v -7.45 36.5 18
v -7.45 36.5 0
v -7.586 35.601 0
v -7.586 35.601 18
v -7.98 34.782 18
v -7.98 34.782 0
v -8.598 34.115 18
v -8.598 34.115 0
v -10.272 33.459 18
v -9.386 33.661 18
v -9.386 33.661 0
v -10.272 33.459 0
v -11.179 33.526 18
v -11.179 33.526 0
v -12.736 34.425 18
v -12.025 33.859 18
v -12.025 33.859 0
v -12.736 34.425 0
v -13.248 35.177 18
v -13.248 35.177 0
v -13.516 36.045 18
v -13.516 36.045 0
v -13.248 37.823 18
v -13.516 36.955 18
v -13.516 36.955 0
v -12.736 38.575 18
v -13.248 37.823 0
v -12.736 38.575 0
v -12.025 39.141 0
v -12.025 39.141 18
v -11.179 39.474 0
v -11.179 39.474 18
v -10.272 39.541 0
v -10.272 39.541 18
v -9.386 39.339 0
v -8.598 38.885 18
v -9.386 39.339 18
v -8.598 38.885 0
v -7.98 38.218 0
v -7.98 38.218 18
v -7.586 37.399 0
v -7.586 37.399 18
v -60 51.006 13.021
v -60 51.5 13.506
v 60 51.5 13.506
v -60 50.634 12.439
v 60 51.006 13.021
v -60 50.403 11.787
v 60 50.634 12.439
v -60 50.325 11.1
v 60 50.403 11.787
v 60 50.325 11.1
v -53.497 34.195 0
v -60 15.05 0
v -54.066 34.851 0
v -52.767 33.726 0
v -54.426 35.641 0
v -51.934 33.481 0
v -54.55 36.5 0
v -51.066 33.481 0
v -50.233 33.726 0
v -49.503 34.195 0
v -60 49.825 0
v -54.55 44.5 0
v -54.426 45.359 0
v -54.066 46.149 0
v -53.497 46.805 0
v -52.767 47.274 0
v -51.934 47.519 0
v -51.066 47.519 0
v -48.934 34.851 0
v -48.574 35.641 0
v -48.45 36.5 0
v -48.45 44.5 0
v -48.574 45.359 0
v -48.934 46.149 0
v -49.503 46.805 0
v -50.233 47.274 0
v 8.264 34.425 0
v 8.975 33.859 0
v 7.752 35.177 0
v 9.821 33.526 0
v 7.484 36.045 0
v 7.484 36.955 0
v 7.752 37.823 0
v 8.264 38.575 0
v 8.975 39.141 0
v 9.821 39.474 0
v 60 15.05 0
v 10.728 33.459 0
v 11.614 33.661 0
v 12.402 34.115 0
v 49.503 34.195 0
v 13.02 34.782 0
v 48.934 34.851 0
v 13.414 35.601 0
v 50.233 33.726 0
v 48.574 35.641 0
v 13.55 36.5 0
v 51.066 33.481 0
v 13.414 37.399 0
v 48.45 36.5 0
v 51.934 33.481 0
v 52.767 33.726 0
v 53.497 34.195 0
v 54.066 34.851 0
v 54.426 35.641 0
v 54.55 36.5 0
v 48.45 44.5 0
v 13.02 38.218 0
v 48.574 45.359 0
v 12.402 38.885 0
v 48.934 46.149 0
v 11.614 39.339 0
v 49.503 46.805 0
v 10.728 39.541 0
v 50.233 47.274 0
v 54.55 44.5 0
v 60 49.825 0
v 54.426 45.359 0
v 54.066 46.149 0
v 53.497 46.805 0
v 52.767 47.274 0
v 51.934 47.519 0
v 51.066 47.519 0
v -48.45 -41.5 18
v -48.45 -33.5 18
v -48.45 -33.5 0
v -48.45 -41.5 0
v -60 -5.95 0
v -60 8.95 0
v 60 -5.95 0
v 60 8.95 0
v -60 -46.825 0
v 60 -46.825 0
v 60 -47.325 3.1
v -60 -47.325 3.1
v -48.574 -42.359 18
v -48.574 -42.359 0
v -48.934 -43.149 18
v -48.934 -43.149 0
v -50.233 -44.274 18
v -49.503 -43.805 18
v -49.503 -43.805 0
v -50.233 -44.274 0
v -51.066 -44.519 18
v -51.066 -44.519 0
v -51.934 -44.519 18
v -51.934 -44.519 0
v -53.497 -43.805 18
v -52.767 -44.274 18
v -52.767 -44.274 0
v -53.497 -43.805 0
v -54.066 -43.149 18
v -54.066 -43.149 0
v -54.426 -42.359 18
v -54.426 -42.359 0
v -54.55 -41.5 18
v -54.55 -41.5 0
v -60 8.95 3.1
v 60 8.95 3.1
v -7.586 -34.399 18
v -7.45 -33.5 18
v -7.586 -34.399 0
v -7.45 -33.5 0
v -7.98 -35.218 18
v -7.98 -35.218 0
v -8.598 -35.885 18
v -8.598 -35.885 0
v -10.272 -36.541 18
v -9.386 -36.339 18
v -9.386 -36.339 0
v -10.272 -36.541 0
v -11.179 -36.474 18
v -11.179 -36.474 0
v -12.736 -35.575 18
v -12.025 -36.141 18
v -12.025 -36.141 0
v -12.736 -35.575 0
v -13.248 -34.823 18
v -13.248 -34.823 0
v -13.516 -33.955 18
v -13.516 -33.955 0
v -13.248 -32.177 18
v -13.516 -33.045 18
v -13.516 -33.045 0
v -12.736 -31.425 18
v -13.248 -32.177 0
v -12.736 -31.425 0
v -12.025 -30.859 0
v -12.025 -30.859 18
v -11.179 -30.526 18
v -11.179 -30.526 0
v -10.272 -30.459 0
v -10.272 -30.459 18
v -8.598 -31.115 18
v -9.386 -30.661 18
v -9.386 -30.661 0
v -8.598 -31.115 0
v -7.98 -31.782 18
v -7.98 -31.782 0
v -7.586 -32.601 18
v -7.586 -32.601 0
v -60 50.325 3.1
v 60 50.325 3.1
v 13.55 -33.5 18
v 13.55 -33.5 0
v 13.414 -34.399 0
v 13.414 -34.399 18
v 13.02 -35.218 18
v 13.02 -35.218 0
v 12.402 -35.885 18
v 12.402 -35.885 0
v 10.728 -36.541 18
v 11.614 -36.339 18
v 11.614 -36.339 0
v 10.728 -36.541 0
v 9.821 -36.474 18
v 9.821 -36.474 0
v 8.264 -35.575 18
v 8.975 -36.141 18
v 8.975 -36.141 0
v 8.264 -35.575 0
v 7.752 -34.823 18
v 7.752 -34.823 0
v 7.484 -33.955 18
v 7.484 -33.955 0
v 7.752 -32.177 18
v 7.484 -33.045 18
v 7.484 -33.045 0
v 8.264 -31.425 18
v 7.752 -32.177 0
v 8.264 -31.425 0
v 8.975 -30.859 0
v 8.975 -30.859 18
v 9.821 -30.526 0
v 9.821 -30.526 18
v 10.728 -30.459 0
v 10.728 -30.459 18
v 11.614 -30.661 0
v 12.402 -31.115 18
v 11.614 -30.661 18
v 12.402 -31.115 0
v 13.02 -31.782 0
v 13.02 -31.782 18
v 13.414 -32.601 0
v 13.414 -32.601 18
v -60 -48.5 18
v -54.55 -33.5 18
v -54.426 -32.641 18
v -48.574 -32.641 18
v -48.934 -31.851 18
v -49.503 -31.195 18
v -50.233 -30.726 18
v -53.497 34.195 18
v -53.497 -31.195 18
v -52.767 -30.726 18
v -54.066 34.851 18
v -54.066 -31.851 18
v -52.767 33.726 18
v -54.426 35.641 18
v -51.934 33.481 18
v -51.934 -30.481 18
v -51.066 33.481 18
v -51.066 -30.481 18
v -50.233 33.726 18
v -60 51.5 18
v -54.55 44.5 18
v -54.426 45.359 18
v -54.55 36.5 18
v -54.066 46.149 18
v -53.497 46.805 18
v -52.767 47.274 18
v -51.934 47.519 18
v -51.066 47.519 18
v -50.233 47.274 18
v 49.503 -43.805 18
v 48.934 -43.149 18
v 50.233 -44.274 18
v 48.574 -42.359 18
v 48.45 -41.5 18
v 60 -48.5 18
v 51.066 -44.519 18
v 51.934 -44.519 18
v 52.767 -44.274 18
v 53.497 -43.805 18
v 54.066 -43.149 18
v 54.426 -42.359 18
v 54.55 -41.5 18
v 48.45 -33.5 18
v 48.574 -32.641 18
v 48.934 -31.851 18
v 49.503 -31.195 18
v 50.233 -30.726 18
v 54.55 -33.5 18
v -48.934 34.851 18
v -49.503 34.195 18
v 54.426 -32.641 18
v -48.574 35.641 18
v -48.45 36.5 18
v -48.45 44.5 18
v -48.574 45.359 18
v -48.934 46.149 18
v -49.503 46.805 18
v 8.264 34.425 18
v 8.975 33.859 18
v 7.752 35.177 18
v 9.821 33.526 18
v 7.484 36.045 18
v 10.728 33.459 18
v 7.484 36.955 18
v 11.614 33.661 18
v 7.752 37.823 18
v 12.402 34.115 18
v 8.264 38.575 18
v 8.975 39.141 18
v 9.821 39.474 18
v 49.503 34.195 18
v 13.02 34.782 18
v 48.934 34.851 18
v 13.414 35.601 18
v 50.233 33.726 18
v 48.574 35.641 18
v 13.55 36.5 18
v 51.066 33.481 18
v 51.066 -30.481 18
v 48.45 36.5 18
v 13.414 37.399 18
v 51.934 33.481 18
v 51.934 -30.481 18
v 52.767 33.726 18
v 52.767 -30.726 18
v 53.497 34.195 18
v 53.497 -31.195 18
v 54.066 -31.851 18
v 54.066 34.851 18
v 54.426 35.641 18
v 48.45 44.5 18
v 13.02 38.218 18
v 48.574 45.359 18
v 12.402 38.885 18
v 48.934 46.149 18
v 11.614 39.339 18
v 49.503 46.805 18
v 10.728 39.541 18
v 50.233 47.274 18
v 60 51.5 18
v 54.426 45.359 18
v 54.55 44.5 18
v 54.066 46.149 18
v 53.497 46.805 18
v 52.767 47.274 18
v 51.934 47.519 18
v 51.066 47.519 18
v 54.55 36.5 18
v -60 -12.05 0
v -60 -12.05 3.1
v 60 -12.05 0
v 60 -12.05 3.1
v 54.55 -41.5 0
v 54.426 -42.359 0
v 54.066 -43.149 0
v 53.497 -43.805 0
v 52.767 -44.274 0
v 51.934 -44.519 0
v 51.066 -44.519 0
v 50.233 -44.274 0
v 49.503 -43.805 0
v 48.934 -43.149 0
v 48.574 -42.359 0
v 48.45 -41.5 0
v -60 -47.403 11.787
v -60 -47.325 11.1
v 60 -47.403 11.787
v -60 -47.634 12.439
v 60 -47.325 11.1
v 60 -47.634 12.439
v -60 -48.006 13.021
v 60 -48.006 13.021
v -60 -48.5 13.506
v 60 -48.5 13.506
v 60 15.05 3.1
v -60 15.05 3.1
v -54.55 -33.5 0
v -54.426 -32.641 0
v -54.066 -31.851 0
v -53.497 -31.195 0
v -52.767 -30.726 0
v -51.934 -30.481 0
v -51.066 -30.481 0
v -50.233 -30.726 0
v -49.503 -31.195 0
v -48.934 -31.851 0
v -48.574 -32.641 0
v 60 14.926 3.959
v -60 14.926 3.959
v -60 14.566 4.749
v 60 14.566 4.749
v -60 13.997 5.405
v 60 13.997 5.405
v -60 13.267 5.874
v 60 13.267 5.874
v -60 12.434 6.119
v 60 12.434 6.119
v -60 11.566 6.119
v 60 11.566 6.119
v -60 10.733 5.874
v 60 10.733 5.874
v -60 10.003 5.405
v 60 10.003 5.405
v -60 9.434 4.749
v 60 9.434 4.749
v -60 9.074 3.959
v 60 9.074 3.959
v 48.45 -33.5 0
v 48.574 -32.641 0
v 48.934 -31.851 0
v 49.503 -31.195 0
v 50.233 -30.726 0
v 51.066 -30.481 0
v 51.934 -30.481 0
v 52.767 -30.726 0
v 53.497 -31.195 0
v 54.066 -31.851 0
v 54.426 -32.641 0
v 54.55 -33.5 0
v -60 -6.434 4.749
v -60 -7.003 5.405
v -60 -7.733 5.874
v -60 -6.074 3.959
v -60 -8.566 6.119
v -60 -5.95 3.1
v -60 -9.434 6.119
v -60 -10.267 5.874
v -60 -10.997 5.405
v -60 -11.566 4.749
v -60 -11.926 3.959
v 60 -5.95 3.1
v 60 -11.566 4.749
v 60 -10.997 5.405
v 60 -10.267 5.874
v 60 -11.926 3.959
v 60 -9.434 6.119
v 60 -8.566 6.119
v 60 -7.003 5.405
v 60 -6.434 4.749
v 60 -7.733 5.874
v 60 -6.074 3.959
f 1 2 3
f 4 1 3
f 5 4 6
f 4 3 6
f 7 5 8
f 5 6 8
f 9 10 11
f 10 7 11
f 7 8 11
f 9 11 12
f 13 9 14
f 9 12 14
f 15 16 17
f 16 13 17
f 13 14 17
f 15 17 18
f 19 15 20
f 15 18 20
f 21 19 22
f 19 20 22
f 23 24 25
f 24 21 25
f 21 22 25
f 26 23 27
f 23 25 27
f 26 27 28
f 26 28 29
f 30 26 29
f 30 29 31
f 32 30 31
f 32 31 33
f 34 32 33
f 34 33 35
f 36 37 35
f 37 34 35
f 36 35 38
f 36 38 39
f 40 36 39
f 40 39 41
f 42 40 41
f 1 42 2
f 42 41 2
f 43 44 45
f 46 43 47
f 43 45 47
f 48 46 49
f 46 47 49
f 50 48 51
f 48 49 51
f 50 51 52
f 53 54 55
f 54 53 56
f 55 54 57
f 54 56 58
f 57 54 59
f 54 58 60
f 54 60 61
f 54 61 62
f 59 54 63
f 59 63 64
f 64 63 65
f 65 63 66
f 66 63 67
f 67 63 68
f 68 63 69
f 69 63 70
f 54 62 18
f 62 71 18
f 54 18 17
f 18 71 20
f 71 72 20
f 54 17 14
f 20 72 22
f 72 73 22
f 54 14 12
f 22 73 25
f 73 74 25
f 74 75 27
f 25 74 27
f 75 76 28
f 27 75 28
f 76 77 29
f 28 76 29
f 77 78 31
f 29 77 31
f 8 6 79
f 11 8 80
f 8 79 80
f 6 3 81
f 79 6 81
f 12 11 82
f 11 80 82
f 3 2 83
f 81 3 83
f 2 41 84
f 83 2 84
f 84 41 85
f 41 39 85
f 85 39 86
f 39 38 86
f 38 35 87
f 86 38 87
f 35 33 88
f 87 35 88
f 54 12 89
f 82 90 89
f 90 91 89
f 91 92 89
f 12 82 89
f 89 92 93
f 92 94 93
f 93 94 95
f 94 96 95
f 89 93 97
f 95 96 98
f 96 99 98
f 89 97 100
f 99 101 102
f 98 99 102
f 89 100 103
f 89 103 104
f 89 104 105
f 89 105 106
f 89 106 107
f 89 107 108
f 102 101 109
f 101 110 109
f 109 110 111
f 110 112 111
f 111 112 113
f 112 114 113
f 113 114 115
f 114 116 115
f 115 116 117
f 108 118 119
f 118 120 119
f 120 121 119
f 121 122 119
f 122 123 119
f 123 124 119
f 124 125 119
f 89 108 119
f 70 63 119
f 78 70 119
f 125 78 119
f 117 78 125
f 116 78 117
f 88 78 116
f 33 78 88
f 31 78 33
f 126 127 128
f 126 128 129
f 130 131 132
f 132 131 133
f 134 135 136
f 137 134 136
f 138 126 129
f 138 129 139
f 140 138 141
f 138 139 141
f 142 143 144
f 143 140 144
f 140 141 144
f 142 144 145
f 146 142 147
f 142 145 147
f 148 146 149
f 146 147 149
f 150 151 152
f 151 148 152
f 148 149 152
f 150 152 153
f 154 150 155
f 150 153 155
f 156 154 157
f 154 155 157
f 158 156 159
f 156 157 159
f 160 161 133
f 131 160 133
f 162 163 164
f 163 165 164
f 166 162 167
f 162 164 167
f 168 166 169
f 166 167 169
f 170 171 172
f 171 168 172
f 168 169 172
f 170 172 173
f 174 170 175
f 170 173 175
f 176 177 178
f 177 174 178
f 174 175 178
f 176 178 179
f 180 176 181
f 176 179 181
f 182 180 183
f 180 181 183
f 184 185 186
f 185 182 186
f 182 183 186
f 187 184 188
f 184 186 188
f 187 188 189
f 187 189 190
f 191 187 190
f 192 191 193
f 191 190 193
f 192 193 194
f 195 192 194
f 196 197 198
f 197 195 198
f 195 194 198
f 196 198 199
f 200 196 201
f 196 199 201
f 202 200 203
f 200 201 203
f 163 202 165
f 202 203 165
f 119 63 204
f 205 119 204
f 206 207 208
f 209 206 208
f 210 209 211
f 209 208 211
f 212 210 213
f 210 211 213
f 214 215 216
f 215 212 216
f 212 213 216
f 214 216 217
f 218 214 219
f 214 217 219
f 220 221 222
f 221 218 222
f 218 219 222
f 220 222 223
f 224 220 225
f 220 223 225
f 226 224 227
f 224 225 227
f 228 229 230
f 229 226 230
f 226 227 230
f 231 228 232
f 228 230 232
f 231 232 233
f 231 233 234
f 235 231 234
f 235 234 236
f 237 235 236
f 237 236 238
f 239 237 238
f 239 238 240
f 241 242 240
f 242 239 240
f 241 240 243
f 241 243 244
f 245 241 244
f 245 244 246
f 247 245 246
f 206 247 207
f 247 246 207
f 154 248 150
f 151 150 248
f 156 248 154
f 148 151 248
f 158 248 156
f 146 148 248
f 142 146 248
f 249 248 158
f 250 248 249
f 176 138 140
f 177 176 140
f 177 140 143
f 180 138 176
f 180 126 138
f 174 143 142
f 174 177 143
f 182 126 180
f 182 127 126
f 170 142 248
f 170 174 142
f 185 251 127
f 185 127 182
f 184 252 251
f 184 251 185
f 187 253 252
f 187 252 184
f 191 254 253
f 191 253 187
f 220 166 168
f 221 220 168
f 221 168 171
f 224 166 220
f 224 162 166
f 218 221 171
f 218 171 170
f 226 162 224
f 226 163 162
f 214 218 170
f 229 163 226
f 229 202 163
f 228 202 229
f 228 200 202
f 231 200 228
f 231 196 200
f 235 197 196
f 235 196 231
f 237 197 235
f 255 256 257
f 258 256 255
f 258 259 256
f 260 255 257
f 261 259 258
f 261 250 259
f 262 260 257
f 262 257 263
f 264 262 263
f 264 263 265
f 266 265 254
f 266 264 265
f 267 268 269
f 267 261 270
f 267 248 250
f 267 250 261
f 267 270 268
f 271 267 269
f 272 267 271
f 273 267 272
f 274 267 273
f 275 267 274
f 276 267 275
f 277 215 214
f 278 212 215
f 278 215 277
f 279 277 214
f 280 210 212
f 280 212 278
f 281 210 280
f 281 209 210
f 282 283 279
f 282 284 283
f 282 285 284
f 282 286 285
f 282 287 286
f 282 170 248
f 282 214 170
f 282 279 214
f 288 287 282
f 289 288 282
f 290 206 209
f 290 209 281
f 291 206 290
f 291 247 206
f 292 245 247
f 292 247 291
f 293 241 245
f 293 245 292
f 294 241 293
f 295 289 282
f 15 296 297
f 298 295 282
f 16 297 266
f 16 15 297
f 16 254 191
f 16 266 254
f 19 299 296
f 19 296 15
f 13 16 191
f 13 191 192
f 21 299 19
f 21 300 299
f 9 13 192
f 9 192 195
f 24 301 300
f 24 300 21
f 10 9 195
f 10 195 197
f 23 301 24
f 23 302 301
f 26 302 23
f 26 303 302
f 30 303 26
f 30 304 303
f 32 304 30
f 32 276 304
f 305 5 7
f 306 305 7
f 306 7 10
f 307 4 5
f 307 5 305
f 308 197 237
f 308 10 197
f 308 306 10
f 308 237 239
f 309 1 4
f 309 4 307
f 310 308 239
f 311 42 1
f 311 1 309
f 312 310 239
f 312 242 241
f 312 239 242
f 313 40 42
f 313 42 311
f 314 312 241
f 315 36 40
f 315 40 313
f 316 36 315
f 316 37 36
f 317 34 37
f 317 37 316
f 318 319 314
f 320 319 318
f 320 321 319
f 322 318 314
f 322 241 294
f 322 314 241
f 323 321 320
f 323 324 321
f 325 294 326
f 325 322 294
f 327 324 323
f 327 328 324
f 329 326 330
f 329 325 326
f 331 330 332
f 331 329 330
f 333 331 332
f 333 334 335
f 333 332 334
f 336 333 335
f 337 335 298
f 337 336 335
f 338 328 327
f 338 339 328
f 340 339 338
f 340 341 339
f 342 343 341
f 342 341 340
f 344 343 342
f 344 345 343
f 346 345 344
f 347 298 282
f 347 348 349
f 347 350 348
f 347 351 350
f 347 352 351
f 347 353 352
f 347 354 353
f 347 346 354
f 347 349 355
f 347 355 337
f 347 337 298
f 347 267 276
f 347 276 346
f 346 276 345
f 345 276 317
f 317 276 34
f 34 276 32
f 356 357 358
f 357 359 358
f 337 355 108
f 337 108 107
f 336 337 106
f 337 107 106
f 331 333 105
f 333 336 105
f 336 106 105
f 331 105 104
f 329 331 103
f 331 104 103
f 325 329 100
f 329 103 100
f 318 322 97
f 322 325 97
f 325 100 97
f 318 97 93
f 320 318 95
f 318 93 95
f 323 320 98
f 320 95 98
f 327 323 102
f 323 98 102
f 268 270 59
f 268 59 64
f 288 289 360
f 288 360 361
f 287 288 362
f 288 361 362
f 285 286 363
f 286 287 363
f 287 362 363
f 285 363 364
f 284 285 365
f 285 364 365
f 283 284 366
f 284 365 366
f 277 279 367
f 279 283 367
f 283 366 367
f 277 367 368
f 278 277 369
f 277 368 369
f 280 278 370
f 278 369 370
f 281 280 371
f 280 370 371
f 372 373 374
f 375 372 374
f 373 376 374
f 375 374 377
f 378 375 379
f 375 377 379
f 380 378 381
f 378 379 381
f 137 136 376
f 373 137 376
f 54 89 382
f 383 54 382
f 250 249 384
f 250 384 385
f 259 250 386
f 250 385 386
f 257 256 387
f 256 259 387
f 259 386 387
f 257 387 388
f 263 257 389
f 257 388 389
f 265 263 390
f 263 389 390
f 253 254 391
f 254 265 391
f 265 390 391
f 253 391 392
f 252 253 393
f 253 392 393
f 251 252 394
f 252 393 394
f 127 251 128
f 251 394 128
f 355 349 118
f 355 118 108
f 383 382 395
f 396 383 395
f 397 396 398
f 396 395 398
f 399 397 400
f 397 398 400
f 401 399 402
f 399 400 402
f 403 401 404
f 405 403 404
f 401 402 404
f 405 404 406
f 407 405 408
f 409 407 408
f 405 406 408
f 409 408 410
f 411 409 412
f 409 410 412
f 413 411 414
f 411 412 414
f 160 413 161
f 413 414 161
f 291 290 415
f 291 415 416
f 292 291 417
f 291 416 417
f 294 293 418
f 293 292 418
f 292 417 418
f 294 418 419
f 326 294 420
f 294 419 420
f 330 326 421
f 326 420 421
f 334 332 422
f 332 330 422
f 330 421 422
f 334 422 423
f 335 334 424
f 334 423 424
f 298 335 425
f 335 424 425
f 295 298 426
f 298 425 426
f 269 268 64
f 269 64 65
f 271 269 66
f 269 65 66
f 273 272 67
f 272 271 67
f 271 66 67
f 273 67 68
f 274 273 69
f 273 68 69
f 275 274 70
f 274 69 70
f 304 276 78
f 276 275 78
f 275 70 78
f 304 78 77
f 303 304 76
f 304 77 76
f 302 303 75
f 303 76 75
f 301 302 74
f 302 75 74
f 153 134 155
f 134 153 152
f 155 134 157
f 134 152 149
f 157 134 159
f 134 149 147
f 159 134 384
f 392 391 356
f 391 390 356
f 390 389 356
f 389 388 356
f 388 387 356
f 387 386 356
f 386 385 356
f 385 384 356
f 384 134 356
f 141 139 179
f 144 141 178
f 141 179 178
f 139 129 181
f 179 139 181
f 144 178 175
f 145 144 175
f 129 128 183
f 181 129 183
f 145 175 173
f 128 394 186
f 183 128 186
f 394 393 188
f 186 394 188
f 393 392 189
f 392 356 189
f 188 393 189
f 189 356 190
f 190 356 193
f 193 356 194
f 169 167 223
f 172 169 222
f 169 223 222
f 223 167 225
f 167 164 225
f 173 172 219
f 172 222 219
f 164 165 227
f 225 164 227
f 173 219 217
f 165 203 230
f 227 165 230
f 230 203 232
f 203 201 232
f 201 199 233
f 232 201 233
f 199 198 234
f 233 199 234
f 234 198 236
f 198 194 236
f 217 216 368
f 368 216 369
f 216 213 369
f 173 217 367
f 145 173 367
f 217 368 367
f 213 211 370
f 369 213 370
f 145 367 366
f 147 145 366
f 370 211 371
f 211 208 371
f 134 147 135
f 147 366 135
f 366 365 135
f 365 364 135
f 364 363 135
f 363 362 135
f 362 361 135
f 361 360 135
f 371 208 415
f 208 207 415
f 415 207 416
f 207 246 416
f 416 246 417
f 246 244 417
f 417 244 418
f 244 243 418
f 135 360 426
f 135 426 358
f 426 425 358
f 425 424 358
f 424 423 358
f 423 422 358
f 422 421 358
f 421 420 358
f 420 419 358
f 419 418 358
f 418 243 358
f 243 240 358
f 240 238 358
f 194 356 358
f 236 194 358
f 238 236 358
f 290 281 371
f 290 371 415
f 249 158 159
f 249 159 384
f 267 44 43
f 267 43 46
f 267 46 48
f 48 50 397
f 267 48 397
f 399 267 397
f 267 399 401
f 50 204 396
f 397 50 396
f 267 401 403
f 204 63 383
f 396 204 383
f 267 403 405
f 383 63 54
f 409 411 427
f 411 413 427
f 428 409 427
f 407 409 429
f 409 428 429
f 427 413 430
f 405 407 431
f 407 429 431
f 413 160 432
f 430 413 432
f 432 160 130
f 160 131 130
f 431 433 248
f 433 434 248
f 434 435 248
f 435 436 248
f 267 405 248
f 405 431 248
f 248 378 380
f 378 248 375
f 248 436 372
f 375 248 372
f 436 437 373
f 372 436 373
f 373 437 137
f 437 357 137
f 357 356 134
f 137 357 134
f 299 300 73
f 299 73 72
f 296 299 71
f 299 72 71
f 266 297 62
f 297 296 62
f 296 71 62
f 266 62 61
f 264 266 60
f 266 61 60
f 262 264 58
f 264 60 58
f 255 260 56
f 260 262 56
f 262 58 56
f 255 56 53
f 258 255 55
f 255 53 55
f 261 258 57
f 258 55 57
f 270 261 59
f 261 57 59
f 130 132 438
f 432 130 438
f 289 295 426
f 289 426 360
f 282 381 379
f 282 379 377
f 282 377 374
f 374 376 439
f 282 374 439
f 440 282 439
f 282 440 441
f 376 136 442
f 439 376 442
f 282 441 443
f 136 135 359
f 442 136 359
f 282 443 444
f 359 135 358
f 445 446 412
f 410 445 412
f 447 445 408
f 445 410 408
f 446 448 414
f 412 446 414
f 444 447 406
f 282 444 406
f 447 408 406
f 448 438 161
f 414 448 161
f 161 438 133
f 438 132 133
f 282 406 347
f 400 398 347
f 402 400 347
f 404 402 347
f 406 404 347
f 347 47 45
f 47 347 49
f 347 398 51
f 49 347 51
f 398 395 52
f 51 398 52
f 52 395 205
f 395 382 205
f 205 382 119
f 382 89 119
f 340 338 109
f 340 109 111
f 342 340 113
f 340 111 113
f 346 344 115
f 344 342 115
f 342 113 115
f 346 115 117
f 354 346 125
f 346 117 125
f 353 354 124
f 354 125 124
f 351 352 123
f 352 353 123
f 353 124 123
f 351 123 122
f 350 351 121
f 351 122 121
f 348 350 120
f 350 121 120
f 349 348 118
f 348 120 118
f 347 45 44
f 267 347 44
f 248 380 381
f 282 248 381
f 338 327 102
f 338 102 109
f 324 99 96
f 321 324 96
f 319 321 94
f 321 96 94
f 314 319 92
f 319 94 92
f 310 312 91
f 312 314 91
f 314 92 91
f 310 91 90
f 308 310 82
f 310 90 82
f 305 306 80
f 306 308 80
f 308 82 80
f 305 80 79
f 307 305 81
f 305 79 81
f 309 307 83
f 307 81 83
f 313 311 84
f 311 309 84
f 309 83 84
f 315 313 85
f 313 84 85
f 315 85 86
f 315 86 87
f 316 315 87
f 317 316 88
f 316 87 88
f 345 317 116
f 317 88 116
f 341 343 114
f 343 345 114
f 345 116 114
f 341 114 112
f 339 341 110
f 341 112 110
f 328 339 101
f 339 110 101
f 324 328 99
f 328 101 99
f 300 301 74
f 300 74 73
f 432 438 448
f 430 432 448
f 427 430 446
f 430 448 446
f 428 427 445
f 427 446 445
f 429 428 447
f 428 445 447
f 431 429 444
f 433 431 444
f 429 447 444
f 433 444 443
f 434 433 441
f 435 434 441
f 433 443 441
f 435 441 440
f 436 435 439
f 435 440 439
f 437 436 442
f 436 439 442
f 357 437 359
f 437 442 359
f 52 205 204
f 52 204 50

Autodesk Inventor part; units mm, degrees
ref_plane "YZ Plane" through (0, 0, 0) normal (1, 0, 0) x (0, 1, 0)
ref_plane "XZ Plane" through (0, 0, 0) normal (0, 1, 0) x (-1, 0, 0)
ref_plane "XY Plane" through (0, 0, 0) normal (0, 0, 1) x (1, 0, 0)
sketch "Sketch1" plane through (0, 0, 0) normal (0, 0, 1) x (1, 0, 0)
  circle A0 centre (10.5, 36.5) radius 3.05 projected
  circle A1 centre (-10.5, 36.5) radius 3.05 projected
  circle A2 centre (-10.5, -33.5) radius 3.05 projected
  circle A3 centre (10.5, -33.5) radius 3.05 projected
  line L0 (60, 51.5) -> (-60, 51.5) projected
  line L1 (-60, 51.5) -> (-60, -48.5) projected
  line L2 (-60, -48.5) -> (60, -48.5) projected
  line L3 (60, -48.5) -> (60, 51.5) projected
  circle A4 centre (51.5, 8.625) radius 3.05 projected
  circle A5 centre (-51.5, -5.625) radius 3.05 projected
  circle A6 centre (51.5, -5.625) radius 3.05 projected
  circle A7 centre (-51.5, 8.625) radius 3.05 projected
  arc A8 (-54.55, 36.5) -> (-48.45, 36.5) centre (-51.5, 36.5) ccw projected
  arc A9 (48.45, 36.5) -> (54.55, 36.5) centre (51.5, 36.5) ccw projected
  arc A10 (54.55, -33.5) -> (48.45, -33.5) centre (51.5, -33.5) ccw projected
  arc A11 (-48.45, -33.5) -> (-54.55, -33.5) centre (-51.5, -33.5) ccw projected
  arc A12 (-13.55, 8.625) -> (-7.45, 8.625) centre (-10.5, 8.625) ccw projected
  arc A13 (13.55, -5.625) -> (7.45, -5.625) centre (10.5, -5.625) ccw projected
  arc A14 (-7.45, -5.625) -> (-13.55, -5.625) centre (-10.5, -5.625) ccw projected
  arc A15 (7.45, 8.625) -> (13.55, 8.625) centre (10.5, 8.625) ccw projected
  line L4 (-48.45, -33.5) -> (-48.45, -41.5) projected
  arc A16 (-54.55, -41.5) -> (-48.45, -41.5) centre (-51.5, -41.5) ccw projected
  line L5 (-54.55, -41.5) -> (-54.55, -33.5) projected
  line L6 (54.55, -33.5) -> (54.55, -41.5) projected
  arc A17 (48.45, -41.5) -> (54.55, -41.5) centre (51.5, -41.5) ccw projected
  line L7 (48.45, -41.5) -> (48.45, -33.5) projected
  line L8 (-54.55, 36.5) -> (-54.55, 44.5) projected
  arc A18 (-48.45, 44.5) -> (-54.55, 44.5) centre (-51.5, 44.5) ccw projected
  line L9 (-48.45, 44.5) -> (-48.45, 36.5) projected
  line L10 (-7.45, -5.625) -> (-7.45, -13.625) projected
  arc A19 (-13.55, -13.625) -> (-7.45, -13.625) centre (-10.5, -13.625) ccw projected
  line L11 (-13.55, -13.625) -> (-13.55, -5.625) projected
  line L12 (13.55, -5.625) -> (13.55, -13.625) projected
  arc A20 (7.45, -13.625) -> (13.55, -13.625) centre (10.5, -13.625) ccw projected
  line L13 (7.45, -13.625) -> (7.45, -5.625) projected
  line L14 (13.55, 16.625) -> (13.55, 8.625) projected
  line L15 (7.45, 8.625) -> (7.45, 16.625) projected
  arc A21 (13.55, 16.625) -> (7.45, 16.625) centre (10.5, 16.625) ccw projected
  line L16 (54.55, 44.5) -> (54.55, 36.5) projected
  line L17 (48.45, 36.5) -> (48.45, 44.5) projected
  arc A22 (54.55, 44.5) -> (48.45, 44.5) centre (51.5, 44.5) ccw projected
  line L18 (-7.45, 16.625) -> (-7.45, 8.625) projected
  line L19 (-13.55, 8.625) -> (-13.55, 16.625) projected
  arc A23 (-7.45, 16.625) -> (-13.55, 16.625) centre (-10.5, 16.625) ccw projected
  point P0 (0, 0)
  point P1 (-51.375, 35)
  point P2 (51.375, 35)
  point P3 (51.375, -35)
  point P4 (-51.375, -35)
  point P5 (-10.5, 7.125)
  point P6 (10.5, -7.125)
  point P7 (-10.5, -7.125)
  point P8 (10.5, 7.125)
extrude "Extrusion1" add sketch "Sketch1" along normal blind 18 contours L3 L2 L1 L0 | A4 | A5 | A6 | A7 | L19 A23 L18 A12 | L12 A20 L13 A13 | L10 A19 L11 A14 | L15 A21 L14 A15
sketch "Sketch2" plane through (60, -48.5, 0) normal (1, 0, 0) x (0, 0, -1)
  arc A0 (-3.1, 63.55) -> (-3.1, 57.45) centre (-3.1, 60.5) ccw
  arc A1 (-3.1, 42.55) -> (-3.1, 36.45) centre (-3.1, 39.5) ccw
  line L0 (0, 0) -> (0, 100) projected
  line L1 (0, 100) -> (-18, 100) projected
  line L2 (-18, 0) -> (-18, 100) projected
  line L3 (0, 0) -> (-18, 0) projected
  circle A2 centre (66.9, 39.625) radius 3.05 construction
  circle A3 centre (66.9, 60.375) radius 3.05 construction
  circle A4 centre (-3.1, 60.375) radius 3.05 construction
  circle A5 centre (-3.1, 39.625) radius 3.05 construction
  line L4 (81.9, -10) -> (81.9, 110) construction
  line L5 (81.9, 110) -> (-18.1, 110) construction
  line L6 (-18.1, 110) -> (-18.1, -10) construction
  line L7 (-18.1, -10) -> (81.9, -10) construction
  line L8 (-3.1, -4.425) -> (0, -4.425)
  line L9 (0, -4.425) -> (0, 1.675)
  line L10 (0, 1.675) -> (-3.1, 1.675)
  line L11 (0, 100) -> (0, 0) projected
  line L12 (-3.1, 36.45) -> (0, 36.45)
  line L13 (0, 36.45) -> (0, 42.55)
  line L14 (0, 42.55) -> (-3.1, 42.55)
  line L15 (-3.1, 57.45) -> (0, 57.45)
  line L16 (0, 57.45) -> (0, 63.55)
  line L17 (0, 63.55) -> (-3.1, 63.55)
  line L18 (-3.1, 98.325) -> (0, 98.325)
  line L19 (0, 98.325) -> (0, 104.425)
  line L20 (0, 104.425) -> (-3.1, 104.425)
  line L21 (-3.1, -1.375) -> (-3.1, 101.375) construction
  line L22 (-3.1, 60.5) -> (-3.1, 39.5) construction
  circle A6 centre (39.025, -1.875) radius 3.05 projected
  circle A7 centre (24.775, 101.875) radius 3.05 projected
  circle A8 centre (24.775, -1.875) radius 3.05 projected
  circle A9 centre (39.025, 101.875) radius 3.05 projected
  arc A10 (66.9, 104.925) -> (66.9, 98.825) centre (66.9, 101.875) ccw projected
  arc A11 (66.9, 1.175) -> (66.9, -4.925) centre (66.9, -1.875) ccw projected
  arc A12 (-3.1, -4.925) -> (-3.1, 1.175) centre (-3.1, -1.875) ccw projected
  arc A13 (-3.1, 98.825) -> (-3.1, 104.925) centre (-3.1, 101.875) ccw projected
  arc A14 (39.025, 63.425) -> (39.025, 57.325) centre (39.025, 60.375) ccw projected
  arc A15 (24.775, 36.575) -> (24.775, 42.675) centre (24.775, 39.625) ccw projected
  arc A16 (24.775, 57.325) -> (24.775, 63.425) centre (24.775, 60.375) ccw projected
  arc A17 (39.025, 42.675) -> (39.025, 36.575) centre (39.025, 39.625) ccw projected
  line L23 (-3.1, 98.825) -> (-11.1, 98.825) projected
  arc A18 (-11.1, 104.925) -> (-11.1, 98.825) centre (-11.1, 101.875) ccw projected
  line L24 (-11.1, 104.925) -> (-3.1, 104.925) projected
  line L25 (-3.1, -4.925) -> (-11.1, -4.925) projected
  arc A19 (-11.1, 1.175) -> (-11.1, -4.925) centre (-11.1, -1.875) ccw projected
  line L26 (-11.1, 1.175) -> (-3.1, 1.175) projected
  line L27 (66.9, 104.925) -> (74.9, 104.925) projected
  arc A20 (74.9, 98.825) -> (74.9, 104.925) centre (74.9, 101.875) ccw projected
  line L28 (74.9, 98.825) -> (66.9, 98.825) projected
  line L29 (24.775, 57.325) -> (16.775, 57.325) projected
  arc A21 (16.775, 63.425) -> (16.775, 57.325) centre (16.775, 60.375) ccw projected
  line L30 (16.775, 63.425) -> (24.775, 63.425) projected
  line L31 (24.775, 36.575) -> (16.775, 36.575) projected
  arc A22 (16.775, 42.675) -> (16.775, 36.575) centre (16.775, 39.625) ccw projected
  line L32 (16.775, 42.675) -> (24.775, 42.675) projected
  line L33 (47.025, 36.575) -> (39.025, 36.575) projected
  line L34 (39.025, 42.675) -> (47.025, 42.675) projected
  arc A23 (47.025, 36.575) -> (47.025, 42.675) centre (47.025, 39.625) ccw projected
  line L35 (74.9, -4.925) -> (66.9, -4.925) projected
  line L36 (66.9, 1.175) -> (74.9, 1.175) projected
  arc A24 (74.9, -4.925) -> (74.9, 1.175) centre (74.9, -1.875) ccw projected
  line L37 (47.025, 57.325) -> (39.025, 57.325) projected
  line L38 (39.025, 63.425) -> (47.025, 63.425) projected
  arc A25 (47.025, 57.325) -> (47.025, 63.425) centre (47.025, 60.375) ccw projected
  point P0 (0, 48.5)
  point P1 (-3.1, 50)
  point P2 (-18, 50)
  point P3 (-3.1, 50)
  point P4 (-3.1, 50)
  point P5 (-3.1, 50)
  point P6 (-3.1, 50)
  point P7 (66.9, 101.375)
  point P8 (66.9, -1.375)
  point P9 (-3.1, -1.375)
  point P10 (-3.1, 101.375)
  point P11 (39.025, 60.5)
  point P12 (24.775, 39.5)
  point P13 (24.775, 60.5)
  point P14 (39.025, 39.5)
  dimension "d2" = 6.1
  dimension "d3" = 3.1
  dimension "d4" = 21
  dimension "d5" = 102.75
  dimension "d6" = 6.1
  dimension "d7" = 6.1
  dimension "d8" = 6.1
sketch "Sketch2 outline for Extrusion2" plane through (60, -48.5, 0) normal (1, 0, 0) x (0, 0, -1)
  line L0 (-11.1, -4.925) -> (-3.1, -4.925)
  arc A0 (-11.1, 1.175) -> (-11.1, -4.925) centre (-11.1, -1.875) ccw
  line L1 (-3.1, 1.175) -> (-11.1, 1.175)
  line L2 (0, 1.675) -> (-3.1, 1.175)
  line L3 (0, -4.425) -> (0, 1.675)
  line L4 (-3.1, -4.925) -> (0, -4.425)
  line L5 (0, 104.425) -> (0, 98.325)
  line L6 (0, 98.325) -> (-3.1, 98.825)
  line L7 (-3.1, 98.825) -> (-11.1, 98.825)
  arc A1 (-11.1, 98.825) -> (-11.1, 104.925) centre (-11.1, 101.875) cw
  line L8 (-11.1, 104.925) -> (-3.1, 104.925)
  line L9 (-3.1, 104.925) -> (0, 104.425)
  line L10 (0, 36.45) -> (0, 42.55)
  line L11 (-3.1, 36.45) -> (0, 36.45)
  arc A2 (-3.1, 42.55) -> (-3.1, 36.45) centre (-3.1, 39.5) ccw
  line L12 (0, 42.55) -> (-3.1, 42.55)
  line L13 (0, 57.45) -> (0, 63.55)
  line L14 (-3.1, 57.45) -> (0, 57.45)
  arc A3 (-3.1, 63.55) -> (-3.1, 57.45) centre (-3.1, 60.5) ccw
  line L15 (0, 63.55) -> (-3.1, 63.55)
extrude "Extrusion2" cut sketch "Sketch2 outline for Extrusion2" against normal through all
properties part number "AXYZ" material "PC/ABS Plastic"
